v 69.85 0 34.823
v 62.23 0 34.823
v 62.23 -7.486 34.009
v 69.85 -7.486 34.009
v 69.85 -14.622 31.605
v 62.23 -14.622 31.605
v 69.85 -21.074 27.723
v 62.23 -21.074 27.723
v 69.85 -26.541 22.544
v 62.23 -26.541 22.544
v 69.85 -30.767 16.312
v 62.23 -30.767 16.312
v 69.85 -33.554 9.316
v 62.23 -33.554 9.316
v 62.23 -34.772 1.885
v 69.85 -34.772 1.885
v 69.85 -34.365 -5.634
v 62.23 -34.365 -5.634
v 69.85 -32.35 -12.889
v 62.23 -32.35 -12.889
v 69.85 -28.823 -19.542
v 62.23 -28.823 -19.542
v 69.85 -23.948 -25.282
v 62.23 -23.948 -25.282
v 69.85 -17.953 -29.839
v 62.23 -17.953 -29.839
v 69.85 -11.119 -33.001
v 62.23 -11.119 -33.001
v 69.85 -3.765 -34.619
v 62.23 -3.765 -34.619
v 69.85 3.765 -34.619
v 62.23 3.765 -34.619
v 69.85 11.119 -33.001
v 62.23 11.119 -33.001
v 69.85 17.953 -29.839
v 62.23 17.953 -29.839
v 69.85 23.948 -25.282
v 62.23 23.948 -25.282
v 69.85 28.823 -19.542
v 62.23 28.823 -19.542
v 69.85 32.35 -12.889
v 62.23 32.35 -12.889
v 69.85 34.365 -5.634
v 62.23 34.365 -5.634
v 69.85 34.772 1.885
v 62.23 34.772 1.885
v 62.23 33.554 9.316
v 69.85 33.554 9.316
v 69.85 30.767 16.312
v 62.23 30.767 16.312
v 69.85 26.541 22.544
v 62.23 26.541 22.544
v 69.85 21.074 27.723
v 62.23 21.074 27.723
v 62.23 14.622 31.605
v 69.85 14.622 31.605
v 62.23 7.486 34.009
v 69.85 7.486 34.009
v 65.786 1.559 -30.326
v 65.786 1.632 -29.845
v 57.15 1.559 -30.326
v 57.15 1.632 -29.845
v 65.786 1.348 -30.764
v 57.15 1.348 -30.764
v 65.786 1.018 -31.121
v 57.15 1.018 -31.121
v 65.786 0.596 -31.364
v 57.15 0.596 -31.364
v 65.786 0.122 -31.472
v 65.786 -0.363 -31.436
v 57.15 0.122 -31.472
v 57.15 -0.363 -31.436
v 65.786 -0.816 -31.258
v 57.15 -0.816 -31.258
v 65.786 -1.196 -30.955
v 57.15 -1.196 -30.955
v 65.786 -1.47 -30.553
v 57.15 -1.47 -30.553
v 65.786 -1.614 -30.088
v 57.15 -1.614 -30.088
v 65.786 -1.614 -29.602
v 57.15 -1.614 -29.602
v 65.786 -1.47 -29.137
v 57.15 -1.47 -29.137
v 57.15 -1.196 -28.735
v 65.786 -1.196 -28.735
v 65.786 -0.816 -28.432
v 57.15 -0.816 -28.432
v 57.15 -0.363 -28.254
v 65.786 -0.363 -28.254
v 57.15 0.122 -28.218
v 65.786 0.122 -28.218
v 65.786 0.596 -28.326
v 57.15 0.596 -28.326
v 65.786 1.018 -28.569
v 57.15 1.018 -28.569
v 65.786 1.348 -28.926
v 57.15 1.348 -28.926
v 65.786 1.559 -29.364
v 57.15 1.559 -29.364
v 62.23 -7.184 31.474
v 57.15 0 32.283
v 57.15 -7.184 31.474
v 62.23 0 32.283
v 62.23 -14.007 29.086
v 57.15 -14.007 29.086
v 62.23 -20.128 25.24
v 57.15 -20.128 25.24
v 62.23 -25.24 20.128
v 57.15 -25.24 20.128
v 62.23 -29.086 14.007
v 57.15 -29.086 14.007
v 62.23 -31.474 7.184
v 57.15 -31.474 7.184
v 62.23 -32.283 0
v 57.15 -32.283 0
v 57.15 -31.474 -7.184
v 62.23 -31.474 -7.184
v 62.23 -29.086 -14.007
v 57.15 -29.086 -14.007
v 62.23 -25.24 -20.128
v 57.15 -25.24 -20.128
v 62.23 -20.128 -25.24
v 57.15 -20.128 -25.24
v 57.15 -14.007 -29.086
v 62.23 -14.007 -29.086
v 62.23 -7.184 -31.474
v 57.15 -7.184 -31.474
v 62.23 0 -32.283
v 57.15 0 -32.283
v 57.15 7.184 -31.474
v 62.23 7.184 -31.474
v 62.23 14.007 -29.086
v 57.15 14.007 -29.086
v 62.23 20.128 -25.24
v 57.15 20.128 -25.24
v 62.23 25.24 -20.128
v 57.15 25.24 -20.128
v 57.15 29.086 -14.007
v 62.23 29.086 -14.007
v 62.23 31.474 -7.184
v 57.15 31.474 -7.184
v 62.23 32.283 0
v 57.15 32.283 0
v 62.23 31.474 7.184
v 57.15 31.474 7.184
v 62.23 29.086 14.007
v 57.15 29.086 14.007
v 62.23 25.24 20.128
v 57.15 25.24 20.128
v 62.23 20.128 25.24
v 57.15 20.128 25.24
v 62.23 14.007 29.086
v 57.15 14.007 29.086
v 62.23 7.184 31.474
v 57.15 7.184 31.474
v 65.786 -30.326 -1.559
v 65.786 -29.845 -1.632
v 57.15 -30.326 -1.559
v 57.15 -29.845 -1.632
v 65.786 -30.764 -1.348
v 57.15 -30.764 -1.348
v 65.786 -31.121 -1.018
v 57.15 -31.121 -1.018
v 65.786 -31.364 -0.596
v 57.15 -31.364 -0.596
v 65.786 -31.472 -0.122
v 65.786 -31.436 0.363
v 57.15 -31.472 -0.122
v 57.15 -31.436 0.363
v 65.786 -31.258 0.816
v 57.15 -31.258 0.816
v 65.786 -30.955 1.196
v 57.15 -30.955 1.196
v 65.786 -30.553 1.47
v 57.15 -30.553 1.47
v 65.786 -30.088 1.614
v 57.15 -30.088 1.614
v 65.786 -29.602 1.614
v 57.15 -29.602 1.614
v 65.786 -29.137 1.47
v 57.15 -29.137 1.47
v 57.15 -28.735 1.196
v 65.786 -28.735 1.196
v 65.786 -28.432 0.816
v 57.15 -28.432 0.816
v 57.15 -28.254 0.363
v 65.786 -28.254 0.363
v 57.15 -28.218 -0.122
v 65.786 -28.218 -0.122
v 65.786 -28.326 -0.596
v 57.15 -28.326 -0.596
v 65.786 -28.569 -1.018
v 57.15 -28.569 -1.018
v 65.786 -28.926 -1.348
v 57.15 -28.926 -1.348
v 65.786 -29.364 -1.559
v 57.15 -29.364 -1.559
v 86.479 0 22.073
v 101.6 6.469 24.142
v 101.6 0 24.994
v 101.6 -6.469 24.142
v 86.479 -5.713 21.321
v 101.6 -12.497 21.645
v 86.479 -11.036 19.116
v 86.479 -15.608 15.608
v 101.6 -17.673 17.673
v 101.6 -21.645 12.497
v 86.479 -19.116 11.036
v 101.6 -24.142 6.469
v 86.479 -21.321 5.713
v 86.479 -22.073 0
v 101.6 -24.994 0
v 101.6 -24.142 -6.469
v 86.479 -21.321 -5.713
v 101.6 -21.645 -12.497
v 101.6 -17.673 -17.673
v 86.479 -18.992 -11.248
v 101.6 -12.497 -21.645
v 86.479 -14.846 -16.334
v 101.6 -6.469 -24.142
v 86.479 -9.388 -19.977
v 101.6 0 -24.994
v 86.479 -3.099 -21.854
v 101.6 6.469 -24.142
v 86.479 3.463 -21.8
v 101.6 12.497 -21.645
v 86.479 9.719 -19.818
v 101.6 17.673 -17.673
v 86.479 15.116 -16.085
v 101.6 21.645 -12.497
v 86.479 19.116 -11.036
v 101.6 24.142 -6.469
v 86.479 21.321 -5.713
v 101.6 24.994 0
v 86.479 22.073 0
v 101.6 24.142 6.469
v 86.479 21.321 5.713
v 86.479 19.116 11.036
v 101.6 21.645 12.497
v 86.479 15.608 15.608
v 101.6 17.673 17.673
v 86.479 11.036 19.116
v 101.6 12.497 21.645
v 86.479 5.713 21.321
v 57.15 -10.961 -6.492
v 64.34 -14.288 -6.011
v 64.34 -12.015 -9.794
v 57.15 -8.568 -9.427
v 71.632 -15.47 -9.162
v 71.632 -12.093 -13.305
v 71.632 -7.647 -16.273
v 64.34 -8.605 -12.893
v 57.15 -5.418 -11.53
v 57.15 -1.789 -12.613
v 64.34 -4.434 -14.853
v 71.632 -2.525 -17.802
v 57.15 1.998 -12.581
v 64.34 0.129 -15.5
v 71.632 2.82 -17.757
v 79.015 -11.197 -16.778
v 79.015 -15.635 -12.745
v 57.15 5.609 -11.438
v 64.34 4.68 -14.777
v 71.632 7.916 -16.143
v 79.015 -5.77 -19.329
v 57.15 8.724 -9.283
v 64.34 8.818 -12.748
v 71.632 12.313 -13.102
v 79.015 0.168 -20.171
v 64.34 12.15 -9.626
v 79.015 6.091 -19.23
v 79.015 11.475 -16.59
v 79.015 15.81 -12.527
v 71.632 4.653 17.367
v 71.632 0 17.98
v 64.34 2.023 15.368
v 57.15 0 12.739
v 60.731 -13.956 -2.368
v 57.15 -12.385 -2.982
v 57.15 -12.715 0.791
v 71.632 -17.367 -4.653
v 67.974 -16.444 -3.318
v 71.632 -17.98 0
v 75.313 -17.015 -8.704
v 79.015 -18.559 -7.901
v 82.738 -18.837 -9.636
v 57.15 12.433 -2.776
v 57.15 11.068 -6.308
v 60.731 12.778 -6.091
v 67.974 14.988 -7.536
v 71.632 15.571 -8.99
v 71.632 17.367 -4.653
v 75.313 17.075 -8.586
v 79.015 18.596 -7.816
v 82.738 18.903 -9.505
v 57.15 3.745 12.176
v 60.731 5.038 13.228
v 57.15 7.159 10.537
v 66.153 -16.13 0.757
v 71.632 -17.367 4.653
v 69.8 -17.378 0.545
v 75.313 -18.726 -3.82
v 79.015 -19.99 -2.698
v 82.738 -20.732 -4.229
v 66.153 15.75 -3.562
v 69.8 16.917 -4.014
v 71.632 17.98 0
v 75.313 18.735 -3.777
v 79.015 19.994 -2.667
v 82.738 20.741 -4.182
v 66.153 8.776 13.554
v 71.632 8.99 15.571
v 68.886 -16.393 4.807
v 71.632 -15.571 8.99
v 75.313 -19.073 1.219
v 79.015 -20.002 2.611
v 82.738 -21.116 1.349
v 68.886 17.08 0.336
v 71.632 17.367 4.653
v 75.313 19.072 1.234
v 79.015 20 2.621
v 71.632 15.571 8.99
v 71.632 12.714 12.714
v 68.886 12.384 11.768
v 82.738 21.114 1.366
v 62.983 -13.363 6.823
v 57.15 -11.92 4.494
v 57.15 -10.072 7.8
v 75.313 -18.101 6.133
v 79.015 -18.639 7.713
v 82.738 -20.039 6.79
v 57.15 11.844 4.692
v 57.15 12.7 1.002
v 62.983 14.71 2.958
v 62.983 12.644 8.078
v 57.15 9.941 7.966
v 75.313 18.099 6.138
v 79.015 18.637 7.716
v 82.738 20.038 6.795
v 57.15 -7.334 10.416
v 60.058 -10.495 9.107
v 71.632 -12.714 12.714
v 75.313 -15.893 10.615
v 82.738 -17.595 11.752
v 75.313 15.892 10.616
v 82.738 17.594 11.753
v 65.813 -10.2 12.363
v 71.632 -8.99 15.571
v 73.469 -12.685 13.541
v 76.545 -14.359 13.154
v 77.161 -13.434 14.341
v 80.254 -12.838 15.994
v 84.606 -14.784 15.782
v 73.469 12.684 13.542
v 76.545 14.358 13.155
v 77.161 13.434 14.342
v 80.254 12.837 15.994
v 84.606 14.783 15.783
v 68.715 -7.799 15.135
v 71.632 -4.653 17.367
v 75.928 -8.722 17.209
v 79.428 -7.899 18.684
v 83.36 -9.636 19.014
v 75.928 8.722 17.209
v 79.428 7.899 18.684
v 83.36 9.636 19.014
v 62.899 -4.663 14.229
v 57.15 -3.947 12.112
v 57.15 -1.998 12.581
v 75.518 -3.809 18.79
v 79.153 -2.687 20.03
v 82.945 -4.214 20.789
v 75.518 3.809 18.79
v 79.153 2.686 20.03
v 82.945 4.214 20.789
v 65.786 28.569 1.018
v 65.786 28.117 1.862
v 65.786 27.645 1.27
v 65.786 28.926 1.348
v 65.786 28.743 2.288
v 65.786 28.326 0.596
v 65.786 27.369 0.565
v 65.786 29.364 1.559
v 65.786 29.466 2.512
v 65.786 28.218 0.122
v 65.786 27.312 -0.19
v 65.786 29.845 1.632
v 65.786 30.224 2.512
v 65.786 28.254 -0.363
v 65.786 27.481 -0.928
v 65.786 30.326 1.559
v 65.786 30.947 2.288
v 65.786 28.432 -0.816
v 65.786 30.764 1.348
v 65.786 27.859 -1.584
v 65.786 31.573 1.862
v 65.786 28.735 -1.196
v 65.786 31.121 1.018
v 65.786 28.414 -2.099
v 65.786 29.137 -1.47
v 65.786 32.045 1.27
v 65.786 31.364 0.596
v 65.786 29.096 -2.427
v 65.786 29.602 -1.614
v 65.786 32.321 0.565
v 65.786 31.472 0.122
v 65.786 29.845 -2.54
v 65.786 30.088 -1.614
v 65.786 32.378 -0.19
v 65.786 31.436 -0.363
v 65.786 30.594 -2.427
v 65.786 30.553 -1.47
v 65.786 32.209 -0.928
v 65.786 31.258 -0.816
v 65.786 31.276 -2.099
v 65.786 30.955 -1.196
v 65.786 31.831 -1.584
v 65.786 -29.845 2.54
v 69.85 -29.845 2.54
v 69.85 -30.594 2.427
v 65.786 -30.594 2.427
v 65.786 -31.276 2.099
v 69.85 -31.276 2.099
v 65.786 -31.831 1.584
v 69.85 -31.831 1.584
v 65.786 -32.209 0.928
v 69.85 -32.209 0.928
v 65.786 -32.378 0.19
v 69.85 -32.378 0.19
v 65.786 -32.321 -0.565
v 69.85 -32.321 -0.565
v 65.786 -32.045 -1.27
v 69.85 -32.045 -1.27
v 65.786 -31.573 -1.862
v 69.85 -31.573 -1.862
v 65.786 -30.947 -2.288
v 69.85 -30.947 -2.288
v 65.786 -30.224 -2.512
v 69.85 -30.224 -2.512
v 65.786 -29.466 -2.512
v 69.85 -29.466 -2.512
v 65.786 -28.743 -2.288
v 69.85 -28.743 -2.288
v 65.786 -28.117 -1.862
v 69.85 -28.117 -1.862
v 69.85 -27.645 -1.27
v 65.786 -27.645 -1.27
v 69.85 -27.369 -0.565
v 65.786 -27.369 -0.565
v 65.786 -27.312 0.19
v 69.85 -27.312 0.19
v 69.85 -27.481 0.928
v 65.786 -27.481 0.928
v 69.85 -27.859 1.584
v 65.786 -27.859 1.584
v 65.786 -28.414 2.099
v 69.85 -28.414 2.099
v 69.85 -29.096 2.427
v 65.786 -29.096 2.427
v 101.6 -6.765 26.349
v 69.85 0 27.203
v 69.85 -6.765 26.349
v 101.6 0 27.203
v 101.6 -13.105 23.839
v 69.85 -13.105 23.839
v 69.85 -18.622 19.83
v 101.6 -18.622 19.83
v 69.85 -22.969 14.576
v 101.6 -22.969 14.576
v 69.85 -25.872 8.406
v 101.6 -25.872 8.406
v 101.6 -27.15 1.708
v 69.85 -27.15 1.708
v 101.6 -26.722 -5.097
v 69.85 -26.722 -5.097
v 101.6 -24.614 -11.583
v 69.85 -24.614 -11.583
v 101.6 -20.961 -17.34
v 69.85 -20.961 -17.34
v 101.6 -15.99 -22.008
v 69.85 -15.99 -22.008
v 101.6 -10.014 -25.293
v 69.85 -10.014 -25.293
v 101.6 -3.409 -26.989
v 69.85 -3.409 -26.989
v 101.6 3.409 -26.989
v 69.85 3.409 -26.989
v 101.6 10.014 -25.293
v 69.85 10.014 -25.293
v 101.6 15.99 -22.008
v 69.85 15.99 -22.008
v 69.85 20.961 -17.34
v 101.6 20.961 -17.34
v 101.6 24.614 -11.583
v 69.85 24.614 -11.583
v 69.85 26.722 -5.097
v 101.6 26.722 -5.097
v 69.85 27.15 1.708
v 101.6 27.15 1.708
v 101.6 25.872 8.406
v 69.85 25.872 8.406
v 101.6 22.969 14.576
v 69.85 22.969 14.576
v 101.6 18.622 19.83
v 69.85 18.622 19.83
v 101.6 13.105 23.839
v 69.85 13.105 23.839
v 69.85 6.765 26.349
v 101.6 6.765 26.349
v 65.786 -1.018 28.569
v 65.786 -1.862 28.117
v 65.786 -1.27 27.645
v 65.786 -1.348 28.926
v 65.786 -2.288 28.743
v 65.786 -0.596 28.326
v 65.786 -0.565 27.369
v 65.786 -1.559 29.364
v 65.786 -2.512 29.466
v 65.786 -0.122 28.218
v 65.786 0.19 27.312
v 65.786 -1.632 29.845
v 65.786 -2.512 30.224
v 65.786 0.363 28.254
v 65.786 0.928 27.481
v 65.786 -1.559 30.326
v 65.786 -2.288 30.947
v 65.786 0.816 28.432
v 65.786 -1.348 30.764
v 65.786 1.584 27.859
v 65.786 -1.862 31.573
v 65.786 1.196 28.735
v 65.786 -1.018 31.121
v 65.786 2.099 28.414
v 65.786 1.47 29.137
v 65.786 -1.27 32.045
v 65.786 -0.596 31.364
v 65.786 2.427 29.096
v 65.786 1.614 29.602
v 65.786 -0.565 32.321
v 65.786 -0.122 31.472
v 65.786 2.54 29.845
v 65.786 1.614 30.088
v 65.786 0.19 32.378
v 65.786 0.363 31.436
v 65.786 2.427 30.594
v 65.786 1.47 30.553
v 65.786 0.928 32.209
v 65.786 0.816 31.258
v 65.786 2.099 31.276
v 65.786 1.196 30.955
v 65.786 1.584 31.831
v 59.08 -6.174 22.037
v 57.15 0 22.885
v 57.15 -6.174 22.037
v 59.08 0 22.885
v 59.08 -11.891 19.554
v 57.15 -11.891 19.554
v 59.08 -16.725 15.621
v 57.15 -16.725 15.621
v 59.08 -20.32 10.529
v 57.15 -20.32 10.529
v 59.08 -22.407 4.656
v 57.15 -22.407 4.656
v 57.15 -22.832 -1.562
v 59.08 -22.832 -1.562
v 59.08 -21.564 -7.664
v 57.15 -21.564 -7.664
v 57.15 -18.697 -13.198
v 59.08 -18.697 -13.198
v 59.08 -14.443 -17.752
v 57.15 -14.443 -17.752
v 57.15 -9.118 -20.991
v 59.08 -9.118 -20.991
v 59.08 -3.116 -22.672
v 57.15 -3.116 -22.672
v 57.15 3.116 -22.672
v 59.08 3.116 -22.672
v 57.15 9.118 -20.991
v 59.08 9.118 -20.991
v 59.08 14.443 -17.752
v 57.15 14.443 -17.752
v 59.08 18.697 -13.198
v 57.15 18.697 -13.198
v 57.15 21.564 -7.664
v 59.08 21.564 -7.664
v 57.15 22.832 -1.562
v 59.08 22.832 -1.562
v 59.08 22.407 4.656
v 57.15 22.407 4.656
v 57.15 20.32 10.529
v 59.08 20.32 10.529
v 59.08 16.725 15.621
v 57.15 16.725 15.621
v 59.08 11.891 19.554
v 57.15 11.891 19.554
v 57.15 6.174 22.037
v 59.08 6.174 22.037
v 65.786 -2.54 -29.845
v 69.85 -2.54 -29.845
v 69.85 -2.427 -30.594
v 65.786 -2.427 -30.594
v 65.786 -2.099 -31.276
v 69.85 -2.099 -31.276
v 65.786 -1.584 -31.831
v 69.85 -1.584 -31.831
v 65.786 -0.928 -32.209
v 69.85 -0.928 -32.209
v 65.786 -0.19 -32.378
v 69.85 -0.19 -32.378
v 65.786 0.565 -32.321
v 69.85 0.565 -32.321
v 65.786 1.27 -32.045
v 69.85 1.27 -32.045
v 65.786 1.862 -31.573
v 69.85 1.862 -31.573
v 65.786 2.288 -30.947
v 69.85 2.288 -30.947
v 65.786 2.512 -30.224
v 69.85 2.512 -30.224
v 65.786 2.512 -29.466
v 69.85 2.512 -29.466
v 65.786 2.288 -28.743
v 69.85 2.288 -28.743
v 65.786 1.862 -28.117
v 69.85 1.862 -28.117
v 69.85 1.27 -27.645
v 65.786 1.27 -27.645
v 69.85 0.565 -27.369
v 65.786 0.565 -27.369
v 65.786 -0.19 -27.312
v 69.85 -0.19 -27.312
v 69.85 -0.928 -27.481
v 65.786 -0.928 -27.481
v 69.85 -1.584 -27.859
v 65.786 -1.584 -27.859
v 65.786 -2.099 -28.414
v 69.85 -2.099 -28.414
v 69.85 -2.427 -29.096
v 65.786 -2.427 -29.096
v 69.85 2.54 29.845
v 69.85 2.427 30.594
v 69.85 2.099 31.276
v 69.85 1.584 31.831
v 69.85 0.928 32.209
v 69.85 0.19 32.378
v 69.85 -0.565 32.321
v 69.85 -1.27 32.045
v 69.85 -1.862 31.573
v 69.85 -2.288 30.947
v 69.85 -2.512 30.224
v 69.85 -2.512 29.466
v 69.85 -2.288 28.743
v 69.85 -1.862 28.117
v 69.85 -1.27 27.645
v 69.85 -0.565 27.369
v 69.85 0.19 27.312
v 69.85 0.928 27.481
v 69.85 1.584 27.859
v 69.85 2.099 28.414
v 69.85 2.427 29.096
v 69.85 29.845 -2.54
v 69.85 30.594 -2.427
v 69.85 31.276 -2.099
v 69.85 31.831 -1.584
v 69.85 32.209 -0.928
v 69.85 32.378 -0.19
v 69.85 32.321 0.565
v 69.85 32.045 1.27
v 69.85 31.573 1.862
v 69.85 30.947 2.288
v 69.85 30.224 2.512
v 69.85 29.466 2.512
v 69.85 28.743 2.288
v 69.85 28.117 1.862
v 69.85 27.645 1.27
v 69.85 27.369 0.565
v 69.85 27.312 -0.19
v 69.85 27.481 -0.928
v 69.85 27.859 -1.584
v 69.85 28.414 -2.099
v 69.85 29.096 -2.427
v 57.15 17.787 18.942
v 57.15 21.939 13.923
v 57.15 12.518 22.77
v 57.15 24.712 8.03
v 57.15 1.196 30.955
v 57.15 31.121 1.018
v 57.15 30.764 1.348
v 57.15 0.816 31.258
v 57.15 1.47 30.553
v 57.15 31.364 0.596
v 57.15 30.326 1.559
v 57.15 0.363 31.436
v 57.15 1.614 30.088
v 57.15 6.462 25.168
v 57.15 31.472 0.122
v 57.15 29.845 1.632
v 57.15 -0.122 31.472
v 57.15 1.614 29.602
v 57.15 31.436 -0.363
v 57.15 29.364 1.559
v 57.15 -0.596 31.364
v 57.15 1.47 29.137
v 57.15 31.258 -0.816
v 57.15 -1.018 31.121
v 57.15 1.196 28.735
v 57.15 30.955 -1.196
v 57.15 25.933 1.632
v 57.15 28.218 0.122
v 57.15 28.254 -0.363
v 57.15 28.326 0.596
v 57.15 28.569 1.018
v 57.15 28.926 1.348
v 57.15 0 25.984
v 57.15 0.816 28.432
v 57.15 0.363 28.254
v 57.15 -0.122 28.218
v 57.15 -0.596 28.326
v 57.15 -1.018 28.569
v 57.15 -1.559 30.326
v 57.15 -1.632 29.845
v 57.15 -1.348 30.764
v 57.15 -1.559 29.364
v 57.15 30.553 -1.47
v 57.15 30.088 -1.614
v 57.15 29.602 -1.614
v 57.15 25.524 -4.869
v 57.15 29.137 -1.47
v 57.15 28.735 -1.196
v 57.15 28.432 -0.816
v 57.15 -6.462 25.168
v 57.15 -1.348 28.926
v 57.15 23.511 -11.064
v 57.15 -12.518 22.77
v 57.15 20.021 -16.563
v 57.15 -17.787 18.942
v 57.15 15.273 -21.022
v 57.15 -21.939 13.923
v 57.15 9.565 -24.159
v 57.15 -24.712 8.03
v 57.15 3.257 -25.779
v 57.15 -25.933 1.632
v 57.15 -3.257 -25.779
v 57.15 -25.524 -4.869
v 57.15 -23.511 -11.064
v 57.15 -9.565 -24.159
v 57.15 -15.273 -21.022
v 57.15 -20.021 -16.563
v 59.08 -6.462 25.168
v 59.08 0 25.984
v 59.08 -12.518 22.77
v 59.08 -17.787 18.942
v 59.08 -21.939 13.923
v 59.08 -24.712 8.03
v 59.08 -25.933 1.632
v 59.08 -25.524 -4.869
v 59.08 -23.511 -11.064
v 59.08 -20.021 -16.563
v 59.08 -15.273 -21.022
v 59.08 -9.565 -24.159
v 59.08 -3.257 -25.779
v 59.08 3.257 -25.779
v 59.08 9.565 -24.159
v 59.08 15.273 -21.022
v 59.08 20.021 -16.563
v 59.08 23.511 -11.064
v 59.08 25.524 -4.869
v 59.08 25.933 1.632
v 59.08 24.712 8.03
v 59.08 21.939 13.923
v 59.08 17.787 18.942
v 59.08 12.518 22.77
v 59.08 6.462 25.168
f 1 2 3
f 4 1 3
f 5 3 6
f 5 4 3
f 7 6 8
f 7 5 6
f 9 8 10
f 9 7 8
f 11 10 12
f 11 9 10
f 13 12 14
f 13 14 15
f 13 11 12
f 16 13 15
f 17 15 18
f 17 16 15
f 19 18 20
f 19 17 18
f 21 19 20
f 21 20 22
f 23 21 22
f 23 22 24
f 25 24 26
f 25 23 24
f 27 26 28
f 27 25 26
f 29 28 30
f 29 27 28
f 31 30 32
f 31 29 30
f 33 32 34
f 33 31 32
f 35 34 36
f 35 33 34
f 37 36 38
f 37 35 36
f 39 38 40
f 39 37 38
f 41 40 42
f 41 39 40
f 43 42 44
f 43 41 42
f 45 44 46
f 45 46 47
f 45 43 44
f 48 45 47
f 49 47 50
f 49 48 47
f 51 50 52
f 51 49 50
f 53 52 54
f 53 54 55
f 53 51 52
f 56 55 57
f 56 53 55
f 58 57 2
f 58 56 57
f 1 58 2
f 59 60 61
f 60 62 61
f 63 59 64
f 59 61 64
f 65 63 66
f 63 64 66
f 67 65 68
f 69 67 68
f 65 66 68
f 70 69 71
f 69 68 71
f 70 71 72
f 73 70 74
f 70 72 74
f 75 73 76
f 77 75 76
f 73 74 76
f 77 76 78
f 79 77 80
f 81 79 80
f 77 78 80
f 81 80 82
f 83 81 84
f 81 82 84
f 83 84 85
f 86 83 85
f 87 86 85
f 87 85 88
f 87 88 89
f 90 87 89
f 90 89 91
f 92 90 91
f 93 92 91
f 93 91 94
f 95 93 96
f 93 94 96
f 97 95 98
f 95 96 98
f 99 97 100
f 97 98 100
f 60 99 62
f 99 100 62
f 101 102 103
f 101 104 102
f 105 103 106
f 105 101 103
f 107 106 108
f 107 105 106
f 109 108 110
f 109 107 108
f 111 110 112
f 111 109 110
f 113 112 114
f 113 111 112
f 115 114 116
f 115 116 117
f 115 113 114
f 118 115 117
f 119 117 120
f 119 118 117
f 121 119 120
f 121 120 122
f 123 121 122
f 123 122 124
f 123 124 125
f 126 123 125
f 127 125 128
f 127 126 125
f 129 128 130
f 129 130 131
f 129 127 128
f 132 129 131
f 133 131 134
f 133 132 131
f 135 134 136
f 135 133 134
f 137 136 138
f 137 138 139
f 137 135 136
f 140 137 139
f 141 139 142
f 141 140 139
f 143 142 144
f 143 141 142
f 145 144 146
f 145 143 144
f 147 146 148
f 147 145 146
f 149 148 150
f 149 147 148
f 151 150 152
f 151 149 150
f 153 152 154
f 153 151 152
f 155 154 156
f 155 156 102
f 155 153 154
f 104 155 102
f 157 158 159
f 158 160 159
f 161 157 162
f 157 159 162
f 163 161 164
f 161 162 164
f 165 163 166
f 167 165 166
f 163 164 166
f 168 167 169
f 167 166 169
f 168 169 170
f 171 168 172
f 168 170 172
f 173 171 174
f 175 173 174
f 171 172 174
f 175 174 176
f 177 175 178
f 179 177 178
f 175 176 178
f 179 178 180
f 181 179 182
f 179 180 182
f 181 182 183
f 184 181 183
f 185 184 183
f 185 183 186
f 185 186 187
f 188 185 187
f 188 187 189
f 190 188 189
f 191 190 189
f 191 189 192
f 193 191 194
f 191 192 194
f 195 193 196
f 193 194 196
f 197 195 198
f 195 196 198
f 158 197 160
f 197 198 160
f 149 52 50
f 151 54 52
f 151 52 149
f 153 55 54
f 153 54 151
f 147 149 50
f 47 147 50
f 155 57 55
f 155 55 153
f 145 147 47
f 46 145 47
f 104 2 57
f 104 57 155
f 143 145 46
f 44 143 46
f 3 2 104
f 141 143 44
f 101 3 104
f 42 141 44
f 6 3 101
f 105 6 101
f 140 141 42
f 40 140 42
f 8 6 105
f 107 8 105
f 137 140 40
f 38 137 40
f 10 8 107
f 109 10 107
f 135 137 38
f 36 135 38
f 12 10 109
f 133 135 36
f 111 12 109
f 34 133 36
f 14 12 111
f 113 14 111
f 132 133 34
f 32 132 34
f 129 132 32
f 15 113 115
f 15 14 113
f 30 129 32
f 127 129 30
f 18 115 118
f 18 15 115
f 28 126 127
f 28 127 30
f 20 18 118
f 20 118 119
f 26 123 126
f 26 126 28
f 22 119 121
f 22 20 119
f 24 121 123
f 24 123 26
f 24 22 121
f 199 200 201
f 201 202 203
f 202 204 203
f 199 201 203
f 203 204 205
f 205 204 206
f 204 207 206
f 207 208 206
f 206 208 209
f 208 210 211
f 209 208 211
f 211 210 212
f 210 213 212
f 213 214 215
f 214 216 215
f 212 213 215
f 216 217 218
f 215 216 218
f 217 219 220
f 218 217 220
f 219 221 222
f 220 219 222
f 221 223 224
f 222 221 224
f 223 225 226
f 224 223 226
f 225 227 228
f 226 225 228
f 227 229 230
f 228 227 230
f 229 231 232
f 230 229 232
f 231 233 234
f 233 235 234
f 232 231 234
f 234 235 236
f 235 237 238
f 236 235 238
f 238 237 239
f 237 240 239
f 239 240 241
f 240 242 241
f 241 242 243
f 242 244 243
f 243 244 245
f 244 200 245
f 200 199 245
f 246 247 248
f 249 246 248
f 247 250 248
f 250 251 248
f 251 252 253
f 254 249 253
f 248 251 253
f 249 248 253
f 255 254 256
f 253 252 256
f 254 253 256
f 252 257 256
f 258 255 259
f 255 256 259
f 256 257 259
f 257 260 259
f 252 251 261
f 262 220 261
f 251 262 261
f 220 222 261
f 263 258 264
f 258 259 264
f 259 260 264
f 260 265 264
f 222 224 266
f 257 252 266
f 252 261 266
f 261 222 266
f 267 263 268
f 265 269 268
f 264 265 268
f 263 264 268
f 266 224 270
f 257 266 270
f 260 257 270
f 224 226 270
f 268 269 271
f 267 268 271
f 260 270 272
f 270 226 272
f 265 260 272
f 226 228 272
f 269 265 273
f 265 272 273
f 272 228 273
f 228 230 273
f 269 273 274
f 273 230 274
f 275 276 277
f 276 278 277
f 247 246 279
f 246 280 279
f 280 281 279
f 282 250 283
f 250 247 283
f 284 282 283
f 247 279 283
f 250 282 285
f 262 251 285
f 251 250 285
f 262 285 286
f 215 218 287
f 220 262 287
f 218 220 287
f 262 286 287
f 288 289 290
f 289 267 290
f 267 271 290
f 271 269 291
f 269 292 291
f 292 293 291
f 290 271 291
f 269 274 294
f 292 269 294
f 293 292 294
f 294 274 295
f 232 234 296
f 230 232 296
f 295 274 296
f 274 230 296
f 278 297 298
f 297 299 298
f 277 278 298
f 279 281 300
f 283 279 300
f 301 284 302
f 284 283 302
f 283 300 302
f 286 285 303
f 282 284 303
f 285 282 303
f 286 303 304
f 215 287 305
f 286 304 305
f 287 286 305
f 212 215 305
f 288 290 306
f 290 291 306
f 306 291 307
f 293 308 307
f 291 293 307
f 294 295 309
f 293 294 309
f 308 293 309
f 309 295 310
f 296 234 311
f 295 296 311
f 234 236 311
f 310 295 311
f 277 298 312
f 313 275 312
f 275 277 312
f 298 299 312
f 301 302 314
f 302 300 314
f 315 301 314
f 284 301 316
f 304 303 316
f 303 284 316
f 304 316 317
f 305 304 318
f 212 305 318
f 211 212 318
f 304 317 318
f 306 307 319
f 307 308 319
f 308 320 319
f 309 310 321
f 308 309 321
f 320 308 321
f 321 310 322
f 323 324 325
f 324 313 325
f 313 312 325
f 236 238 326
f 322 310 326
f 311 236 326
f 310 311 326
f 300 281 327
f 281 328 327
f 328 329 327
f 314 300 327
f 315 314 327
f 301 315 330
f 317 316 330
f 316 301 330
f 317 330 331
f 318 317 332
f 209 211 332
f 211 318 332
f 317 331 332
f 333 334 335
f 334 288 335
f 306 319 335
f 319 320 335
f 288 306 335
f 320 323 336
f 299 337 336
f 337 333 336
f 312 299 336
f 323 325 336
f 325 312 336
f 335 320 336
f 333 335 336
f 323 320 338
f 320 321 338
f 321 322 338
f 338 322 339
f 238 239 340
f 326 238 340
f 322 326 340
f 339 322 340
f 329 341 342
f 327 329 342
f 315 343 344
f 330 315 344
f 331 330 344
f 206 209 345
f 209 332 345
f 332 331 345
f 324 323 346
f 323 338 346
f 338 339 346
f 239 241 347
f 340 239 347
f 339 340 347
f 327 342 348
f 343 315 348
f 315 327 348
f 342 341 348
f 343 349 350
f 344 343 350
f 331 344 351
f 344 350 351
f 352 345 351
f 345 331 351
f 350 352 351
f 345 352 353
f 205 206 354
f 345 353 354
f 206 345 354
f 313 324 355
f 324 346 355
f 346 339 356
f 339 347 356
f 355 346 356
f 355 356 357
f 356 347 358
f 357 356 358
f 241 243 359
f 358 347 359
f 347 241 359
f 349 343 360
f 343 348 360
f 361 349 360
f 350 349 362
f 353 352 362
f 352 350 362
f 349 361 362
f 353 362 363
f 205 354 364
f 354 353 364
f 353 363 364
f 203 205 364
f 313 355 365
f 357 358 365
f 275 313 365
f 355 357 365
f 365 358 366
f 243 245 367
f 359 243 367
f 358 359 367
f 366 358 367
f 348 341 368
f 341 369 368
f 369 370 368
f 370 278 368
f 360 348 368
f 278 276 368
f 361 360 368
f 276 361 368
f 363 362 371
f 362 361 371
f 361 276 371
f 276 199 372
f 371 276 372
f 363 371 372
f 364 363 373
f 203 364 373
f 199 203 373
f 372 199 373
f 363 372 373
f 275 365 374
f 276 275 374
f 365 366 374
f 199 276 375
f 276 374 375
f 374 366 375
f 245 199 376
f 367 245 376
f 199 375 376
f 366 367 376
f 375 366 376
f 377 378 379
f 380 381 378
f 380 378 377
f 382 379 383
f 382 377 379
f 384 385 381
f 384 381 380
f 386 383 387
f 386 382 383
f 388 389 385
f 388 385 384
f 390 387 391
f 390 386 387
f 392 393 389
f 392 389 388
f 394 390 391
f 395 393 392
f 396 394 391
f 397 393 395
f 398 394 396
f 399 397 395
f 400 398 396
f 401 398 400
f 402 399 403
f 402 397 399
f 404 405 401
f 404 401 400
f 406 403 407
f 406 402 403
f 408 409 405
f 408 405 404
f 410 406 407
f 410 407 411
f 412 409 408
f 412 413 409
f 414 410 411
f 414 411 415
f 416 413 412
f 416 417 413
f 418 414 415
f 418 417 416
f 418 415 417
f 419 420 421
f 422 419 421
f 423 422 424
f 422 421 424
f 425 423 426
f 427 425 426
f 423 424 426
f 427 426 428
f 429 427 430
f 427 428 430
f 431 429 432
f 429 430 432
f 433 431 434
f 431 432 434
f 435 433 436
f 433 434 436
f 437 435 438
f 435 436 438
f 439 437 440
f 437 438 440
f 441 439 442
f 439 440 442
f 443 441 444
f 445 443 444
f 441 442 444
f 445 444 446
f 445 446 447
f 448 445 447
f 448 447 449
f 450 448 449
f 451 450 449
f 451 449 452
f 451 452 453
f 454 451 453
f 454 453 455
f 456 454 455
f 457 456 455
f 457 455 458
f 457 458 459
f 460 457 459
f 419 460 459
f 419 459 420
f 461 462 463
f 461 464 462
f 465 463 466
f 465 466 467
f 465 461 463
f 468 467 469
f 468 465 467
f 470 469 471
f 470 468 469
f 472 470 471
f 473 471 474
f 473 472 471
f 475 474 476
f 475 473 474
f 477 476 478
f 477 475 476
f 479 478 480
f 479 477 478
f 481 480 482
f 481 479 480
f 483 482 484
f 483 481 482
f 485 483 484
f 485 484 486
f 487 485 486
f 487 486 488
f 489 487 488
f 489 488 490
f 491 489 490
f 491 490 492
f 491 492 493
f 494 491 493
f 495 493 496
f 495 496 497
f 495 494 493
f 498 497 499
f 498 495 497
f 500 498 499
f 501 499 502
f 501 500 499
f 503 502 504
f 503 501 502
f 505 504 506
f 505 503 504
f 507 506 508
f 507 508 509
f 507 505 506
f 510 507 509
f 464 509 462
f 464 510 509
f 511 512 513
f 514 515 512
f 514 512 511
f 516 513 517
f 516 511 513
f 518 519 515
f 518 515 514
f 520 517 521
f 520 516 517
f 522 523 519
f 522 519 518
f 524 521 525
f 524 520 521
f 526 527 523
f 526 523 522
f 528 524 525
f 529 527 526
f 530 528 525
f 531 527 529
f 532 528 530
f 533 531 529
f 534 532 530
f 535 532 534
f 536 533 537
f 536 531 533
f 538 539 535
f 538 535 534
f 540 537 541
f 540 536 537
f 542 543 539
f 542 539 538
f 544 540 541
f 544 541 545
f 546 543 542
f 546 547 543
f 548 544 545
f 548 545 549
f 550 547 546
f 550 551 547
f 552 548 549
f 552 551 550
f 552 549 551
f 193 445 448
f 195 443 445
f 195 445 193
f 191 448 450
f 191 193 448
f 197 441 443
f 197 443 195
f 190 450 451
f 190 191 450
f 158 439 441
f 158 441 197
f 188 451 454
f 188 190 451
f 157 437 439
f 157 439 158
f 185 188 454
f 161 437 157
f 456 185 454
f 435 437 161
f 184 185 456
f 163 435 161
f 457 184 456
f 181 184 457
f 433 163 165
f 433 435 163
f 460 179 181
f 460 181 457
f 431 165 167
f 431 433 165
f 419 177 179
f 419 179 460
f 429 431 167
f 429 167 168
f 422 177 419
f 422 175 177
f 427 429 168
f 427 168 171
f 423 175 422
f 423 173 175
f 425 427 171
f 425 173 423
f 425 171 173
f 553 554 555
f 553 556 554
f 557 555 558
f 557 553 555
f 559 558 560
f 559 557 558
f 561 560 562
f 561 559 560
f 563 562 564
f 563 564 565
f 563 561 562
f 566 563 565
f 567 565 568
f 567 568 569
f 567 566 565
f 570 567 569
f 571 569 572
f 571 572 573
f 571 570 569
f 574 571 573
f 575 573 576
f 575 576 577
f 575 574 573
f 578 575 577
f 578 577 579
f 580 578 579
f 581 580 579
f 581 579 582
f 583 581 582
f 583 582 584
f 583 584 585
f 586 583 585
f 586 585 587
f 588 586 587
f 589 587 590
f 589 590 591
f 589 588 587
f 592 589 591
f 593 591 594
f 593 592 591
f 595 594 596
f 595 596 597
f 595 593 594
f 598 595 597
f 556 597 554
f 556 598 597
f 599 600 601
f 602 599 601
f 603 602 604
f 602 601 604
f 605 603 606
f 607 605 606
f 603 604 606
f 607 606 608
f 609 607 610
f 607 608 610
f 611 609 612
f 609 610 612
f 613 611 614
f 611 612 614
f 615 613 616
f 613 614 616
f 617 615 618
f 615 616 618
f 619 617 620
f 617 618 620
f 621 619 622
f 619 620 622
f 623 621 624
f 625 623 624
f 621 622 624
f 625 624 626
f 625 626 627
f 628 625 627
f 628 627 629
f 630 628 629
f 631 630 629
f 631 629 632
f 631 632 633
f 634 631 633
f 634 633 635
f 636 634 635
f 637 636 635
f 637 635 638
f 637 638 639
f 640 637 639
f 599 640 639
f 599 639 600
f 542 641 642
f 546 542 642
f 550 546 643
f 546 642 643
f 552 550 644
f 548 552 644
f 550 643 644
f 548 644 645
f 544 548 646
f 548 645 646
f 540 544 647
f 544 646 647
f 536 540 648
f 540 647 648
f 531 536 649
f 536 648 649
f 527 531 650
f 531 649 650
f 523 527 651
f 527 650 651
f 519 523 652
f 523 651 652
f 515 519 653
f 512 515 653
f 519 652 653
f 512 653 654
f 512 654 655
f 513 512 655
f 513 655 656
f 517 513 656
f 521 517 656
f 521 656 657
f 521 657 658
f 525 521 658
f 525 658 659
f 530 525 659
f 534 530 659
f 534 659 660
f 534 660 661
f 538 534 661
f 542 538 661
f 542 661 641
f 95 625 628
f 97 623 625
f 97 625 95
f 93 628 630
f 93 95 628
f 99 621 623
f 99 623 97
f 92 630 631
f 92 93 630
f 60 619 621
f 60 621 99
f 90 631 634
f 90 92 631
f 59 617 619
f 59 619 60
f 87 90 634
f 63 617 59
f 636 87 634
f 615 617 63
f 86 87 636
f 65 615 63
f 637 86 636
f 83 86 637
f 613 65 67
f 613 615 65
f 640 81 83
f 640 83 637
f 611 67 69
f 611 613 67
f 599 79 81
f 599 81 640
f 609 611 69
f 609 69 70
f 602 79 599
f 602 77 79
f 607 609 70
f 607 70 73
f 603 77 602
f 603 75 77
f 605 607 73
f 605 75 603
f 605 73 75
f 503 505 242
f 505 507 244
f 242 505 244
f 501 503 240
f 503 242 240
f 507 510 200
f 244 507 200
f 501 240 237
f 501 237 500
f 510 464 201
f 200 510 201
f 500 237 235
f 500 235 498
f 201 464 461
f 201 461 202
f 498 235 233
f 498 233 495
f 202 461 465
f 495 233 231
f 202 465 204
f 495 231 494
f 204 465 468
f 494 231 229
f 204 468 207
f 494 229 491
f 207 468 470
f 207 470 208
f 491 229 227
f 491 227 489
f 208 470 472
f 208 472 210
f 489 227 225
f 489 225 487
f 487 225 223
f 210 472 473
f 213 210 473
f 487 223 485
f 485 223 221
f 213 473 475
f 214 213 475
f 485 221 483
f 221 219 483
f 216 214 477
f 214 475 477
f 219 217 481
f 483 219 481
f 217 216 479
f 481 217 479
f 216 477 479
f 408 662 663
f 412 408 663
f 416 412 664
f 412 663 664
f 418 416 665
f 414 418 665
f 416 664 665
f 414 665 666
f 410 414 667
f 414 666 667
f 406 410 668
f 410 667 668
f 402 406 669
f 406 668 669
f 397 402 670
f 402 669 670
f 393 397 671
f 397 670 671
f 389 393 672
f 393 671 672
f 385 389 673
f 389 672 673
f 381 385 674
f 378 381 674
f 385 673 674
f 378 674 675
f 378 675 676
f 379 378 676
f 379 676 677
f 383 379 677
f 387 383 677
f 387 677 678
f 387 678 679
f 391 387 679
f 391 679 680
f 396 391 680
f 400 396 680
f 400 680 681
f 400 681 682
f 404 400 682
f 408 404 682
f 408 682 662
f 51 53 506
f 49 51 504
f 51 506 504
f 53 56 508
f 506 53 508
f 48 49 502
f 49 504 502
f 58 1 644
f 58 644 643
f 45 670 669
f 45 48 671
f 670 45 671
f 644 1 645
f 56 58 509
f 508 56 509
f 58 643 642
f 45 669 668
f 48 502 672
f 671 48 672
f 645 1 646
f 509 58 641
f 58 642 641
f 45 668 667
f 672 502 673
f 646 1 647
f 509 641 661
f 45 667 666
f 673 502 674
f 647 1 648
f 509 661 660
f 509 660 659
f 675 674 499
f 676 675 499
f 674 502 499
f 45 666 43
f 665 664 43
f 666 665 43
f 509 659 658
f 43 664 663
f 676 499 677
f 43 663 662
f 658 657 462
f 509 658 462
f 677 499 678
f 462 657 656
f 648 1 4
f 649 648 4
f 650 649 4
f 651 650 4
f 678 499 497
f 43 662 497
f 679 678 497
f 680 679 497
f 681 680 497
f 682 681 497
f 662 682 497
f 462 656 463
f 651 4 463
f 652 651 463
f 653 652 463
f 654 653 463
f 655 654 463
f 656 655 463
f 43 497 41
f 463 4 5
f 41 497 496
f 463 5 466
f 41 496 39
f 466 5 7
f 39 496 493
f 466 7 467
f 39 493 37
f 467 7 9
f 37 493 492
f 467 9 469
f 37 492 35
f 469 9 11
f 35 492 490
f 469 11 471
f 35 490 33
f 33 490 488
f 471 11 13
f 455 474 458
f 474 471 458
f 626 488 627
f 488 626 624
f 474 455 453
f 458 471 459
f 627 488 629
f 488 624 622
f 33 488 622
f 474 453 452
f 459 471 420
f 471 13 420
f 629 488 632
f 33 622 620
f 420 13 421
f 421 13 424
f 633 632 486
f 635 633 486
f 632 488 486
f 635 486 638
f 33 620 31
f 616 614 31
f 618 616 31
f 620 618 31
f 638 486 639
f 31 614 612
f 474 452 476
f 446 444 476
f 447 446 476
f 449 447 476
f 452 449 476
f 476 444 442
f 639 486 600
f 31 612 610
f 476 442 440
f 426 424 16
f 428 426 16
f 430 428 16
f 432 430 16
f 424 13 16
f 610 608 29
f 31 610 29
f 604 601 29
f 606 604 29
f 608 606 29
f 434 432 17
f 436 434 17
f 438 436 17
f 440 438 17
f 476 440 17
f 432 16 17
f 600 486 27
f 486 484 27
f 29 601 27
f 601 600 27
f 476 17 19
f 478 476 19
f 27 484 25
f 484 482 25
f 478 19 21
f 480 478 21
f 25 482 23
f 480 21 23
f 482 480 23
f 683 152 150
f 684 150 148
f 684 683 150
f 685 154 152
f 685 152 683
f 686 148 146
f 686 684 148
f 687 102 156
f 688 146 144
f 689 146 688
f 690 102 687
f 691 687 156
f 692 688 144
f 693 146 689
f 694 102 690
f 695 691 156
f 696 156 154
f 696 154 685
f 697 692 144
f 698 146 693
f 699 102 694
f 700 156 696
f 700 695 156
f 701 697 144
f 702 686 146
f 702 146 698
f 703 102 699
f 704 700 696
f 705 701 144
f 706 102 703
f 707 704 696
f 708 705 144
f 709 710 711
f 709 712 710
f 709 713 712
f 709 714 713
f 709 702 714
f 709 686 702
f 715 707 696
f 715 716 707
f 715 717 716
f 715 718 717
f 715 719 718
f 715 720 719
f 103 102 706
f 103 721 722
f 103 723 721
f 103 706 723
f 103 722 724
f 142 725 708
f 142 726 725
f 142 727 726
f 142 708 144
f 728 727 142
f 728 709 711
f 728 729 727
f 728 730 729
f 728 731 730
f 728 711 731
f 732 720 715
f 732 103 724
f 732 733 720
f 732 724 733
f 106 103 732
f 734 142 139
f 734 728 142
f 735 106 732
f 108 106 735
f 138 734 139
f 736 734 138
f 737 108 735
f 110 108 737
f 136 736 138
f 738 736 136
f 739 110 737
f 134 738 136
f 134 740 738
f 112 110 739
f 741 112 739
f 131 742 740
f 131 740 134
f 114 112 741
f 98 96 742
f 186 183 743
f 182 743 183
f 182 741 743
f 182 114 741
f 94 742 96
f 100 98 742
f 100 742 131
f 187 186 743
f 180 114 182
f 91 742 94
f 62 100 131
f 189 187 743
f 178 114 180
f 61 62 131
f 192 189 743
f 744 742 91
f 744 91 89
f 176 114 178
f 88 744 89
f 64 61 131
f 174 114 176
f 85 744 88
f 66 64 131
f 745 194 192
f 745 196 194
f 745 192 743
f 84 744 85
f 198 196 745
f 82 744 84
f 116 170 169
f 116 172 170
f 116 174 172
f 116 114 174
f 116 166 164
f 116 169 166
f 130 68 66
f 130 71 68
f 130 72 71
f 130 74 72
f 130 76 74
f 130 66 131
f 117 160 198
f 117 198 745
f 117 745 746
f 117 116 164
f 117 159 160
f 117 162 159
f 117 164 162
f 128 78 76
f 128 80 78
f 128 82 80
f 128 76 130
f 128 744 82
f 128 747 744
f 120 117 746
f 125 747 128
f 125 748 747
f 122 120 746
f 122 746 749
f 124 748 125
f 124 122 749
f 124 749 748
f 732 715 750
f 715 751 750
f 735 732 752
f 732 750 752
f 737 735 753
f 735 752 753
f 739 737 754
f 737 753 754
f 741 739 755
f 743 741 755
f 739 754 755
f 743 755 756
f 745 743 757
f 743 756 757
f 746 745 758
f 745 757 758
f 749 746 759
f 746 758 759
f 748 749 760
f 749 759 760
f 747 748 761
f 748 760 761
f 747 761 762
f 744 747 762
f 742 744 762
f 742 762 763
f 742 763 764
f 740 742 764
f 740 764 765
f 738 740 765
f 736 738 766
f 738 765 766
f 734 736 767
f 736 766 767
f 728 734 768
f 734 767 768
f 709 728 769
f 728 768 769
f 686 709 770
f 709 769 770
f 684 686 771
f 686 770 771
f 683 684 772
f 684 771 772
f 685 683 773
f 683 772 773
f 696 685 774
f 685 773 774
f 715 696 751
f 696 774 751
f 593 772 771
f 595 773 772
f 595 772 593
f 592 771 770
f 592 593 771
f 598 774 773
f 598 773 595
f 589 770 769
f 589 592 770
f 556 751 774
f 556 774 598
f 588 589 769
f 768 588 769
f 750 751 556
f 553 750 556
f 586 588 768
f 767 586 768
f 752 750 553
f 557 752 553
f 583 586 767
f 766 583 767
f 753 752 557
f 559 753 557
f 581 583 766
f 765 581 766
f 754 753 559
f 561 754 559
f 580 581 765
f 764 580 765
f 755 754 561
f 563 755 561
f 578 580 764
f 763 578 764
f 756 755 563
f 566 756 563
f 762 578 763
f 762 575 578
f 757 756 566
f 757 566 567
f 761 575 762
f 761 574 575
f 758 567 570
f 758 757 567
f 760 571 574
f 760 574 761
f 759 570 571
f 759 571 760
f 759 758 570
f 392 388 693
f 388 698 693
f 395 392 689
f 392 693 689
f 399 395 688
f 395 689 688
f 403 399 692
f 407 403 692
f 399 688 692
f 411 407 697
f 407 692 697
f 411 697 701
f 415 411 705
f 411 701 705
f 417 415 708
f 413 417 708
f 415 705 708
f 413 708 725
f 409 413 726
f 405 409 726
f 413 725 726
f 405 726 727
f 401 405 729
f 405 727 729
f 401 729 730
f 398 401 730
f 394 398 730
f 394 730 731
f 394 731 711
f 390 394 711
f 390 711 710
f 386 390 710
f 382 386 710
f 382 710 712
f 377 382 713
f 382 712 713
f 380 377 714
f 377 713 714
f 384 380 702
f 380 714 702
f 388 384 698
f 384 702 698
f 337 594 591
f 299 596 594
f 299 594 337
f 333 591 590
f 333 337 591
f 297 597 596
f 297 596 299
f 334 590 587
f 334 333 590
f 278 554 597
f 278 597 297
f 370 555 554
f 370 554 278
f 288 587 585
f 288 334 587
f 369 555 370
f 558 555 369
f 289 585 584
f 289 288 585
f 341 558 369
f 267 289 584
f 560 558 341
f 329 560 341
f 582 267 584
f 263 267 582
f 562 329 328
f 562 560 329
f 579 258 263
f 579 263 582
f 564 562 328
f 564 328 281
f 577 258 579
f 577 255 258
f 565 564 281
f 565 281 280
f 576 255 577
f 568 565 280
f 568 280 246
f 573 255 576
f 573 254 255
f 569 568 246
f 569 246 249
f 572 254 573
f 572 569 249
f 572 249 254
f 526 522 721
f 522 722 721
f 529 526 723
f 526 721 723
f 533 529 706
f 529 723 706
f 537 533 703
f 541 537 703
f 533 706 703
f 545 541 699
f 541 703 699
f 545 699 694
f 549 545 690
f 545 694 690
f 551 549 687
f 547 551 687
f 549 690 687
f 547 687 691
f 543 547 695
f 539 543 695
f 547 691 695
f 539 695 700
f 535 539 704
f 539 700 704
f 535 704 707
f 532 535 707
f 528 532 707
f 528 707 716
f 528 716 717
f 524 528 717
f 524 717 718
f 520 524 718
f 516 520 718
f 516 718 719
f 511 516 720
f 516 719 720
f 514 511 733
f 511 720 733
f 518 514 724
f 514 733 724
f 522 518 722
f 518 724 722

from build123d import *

# Parameters (mm, degrees)
SKETCH1_W         = 101.6
SKETCH1_H         = 34.8234
SKETCH3_W         = 6.35
SKETCH3_H         = 2.667
SKETCH4_W         = 31.75
SKETCH4_H         = 7.62
HOLE1_D           = 3.2639
HOLE1_CBORE_D     = 5.08
HOLE1_CBORE_DEPTH = 4.064
CIRPATTERN1_COUNT = 4
SKETCH12_W        = 1.9304
SKETCH12_H        = 3.0988


with BuildPart() as part:
    # Sketch1 → Revolve1 (revolve)
    with BuildSketch(Plane.XY, mode=Mode.PRIVATE) as revolve1_sk:
        with Locations((50.8, 17.4117)):
            Rectangle(SKETCH1_W, SKETCH1_H)
    revolve(revolve1_sk.sketch.rotate(Axis((-14.406993702, 0, 0), (1, 0, 0)), 90), axis=Axis((-14.406993702, 0, 0), (1, 0, 0)))

    # Sketch2 → Cut-Revolve1 (revolve, cut)
    with BuildSketch(Plane.XY, mode=Mode.PRIVATE) as cut_revolve1_sk:
        with BuildLine():
            Line((0, 28.4734), (10.16, 28.4734))
            ThreePointArc((10.16, 28.4734), (25.296207294, 24.666285192), (36.83, 14.151033402))
            ThreePointArc((36.83, 14.151033402), (41.000418166, 10.205778874), (46.482, 8.5))
            ThreePointArc((46.482, 8.5), (47.320563586, 8.54516677), (48.120613895, 8.800408672))
            ThreePointArc((48.120613895, 8.800408672), (74.283199164, 18.802951678), (101.6, 24.9936))
            Line((101.6, 24.9936), (101.6, 0))
            Line((101.6, 0), (0, 0))
            Line((0, 0), (0, 28.4734))
        make_face()
    revolve(cut_revolve1_sk.sketch.rotate(Axis((-14.406993702, 0, 0), (1, 0, 0)), 90), axis=Axis((-14.406993702, 0, 0), (1, 0, 0)), mode=Mode.SUBTRACT)

    # Sketch3 → Cut-Revolve2 (revolve, cut)
    with BuildSketch(Plane.XY, mode=Mode.PRIVATE) as cut_revolve2_sk:
        with Locations((3.175, 33.4899)):
            Rectangle(SKETCH3_W, SKETCH3_H)
    revolve(cut_revolve2_sk.sketch.rotate(Axis((-14.406993702, 0, 0), (1, 0, 0)), 90), axis=Axis((-14.406993702, 0, 0), (1, 0, 0)), mode=Mode.SUBTRACT)

    # Sketch4 → Cut-Revolve3 (revolve, cut)
    with BuildSketch(Plane.XY, mode=Mode.PRIVATE) as cut_revolve3_sk:
        with Locations((85.725, 31.0134)):
            Rectangle(SKETCH4_W, SKETCH4_H)
    revolve(cut_revolve3_sk.sketch.rotate(Axis((-14.406993702, 0, 0), (1, 0, 0)), 90), axis=Axis((-14.406993702, 0, 0), (1, 0, 0)), mode=Mode.SUBTRACT)

    # Sketch6 → Cut-Revolve4 (revolve, cut)
    with BuildSketch(Plane.XY, mode=Mode.PRIVATE) as cut_revolve4_sk:
        Polygon((57.15, 0), (57.15, 32.2834), (62.23, 32.2834), (62.23, 34.8234), (0, 34.8234), (0, 0), align=None)
    revolve(cut_revolve4_sk.sketch.rotate(Axis((-14.406993702, 0, 0), (1, 0, 0)), 90), axis=Axis((-14.406993702, 0, 0), (1, 0, 0)), mode=Mode.SUBTRACT)

    # Hole1 (through all)
    with Locations(Plane(origin=(69.85, 0, 0), x_dir=(0, 0, -1), z_dir=(1, 0, 0))):
        with Locations((0, 29.845)):
            hole1 = CounterBoreHole(HOLE1_D / 2, HOLE1_CBORE_D / 2, HOLE1_CBORE_DEPTH)

    # CirPattern1: Hole1 ×4 about axis
    cirpattern1_axis = Axis((0, 0, 0), (1, 0, 0))
    for i in range(1, CIRPATTERN1_COUNT):
        add(hole1.rotate(cirpattern1_axis, i * 360 / CIRPATTERN1_COUNT), mode=Mode.SUBTRACT)

    # Sketch12 → Cut-Revolve7 (revolve, cut)
    with BuildSketch(Plane.XY, mode=Mode.PRIVATE) as cut_revolve7_sk:
        with Locations((58.1152, 24.4348)):
            Rectangle(SKETCH12_W, SKETCH12_H)
    revolve(cut_revolve7_sk.sketch.rotate(Axis((-14.406993702, 0, 0), (1, 0, 0)), 90), axis=Axis((-14.406993702, 0, 0), (1, 0, 0)), mode=Mode.SUBTRACT)


solid = part.part
